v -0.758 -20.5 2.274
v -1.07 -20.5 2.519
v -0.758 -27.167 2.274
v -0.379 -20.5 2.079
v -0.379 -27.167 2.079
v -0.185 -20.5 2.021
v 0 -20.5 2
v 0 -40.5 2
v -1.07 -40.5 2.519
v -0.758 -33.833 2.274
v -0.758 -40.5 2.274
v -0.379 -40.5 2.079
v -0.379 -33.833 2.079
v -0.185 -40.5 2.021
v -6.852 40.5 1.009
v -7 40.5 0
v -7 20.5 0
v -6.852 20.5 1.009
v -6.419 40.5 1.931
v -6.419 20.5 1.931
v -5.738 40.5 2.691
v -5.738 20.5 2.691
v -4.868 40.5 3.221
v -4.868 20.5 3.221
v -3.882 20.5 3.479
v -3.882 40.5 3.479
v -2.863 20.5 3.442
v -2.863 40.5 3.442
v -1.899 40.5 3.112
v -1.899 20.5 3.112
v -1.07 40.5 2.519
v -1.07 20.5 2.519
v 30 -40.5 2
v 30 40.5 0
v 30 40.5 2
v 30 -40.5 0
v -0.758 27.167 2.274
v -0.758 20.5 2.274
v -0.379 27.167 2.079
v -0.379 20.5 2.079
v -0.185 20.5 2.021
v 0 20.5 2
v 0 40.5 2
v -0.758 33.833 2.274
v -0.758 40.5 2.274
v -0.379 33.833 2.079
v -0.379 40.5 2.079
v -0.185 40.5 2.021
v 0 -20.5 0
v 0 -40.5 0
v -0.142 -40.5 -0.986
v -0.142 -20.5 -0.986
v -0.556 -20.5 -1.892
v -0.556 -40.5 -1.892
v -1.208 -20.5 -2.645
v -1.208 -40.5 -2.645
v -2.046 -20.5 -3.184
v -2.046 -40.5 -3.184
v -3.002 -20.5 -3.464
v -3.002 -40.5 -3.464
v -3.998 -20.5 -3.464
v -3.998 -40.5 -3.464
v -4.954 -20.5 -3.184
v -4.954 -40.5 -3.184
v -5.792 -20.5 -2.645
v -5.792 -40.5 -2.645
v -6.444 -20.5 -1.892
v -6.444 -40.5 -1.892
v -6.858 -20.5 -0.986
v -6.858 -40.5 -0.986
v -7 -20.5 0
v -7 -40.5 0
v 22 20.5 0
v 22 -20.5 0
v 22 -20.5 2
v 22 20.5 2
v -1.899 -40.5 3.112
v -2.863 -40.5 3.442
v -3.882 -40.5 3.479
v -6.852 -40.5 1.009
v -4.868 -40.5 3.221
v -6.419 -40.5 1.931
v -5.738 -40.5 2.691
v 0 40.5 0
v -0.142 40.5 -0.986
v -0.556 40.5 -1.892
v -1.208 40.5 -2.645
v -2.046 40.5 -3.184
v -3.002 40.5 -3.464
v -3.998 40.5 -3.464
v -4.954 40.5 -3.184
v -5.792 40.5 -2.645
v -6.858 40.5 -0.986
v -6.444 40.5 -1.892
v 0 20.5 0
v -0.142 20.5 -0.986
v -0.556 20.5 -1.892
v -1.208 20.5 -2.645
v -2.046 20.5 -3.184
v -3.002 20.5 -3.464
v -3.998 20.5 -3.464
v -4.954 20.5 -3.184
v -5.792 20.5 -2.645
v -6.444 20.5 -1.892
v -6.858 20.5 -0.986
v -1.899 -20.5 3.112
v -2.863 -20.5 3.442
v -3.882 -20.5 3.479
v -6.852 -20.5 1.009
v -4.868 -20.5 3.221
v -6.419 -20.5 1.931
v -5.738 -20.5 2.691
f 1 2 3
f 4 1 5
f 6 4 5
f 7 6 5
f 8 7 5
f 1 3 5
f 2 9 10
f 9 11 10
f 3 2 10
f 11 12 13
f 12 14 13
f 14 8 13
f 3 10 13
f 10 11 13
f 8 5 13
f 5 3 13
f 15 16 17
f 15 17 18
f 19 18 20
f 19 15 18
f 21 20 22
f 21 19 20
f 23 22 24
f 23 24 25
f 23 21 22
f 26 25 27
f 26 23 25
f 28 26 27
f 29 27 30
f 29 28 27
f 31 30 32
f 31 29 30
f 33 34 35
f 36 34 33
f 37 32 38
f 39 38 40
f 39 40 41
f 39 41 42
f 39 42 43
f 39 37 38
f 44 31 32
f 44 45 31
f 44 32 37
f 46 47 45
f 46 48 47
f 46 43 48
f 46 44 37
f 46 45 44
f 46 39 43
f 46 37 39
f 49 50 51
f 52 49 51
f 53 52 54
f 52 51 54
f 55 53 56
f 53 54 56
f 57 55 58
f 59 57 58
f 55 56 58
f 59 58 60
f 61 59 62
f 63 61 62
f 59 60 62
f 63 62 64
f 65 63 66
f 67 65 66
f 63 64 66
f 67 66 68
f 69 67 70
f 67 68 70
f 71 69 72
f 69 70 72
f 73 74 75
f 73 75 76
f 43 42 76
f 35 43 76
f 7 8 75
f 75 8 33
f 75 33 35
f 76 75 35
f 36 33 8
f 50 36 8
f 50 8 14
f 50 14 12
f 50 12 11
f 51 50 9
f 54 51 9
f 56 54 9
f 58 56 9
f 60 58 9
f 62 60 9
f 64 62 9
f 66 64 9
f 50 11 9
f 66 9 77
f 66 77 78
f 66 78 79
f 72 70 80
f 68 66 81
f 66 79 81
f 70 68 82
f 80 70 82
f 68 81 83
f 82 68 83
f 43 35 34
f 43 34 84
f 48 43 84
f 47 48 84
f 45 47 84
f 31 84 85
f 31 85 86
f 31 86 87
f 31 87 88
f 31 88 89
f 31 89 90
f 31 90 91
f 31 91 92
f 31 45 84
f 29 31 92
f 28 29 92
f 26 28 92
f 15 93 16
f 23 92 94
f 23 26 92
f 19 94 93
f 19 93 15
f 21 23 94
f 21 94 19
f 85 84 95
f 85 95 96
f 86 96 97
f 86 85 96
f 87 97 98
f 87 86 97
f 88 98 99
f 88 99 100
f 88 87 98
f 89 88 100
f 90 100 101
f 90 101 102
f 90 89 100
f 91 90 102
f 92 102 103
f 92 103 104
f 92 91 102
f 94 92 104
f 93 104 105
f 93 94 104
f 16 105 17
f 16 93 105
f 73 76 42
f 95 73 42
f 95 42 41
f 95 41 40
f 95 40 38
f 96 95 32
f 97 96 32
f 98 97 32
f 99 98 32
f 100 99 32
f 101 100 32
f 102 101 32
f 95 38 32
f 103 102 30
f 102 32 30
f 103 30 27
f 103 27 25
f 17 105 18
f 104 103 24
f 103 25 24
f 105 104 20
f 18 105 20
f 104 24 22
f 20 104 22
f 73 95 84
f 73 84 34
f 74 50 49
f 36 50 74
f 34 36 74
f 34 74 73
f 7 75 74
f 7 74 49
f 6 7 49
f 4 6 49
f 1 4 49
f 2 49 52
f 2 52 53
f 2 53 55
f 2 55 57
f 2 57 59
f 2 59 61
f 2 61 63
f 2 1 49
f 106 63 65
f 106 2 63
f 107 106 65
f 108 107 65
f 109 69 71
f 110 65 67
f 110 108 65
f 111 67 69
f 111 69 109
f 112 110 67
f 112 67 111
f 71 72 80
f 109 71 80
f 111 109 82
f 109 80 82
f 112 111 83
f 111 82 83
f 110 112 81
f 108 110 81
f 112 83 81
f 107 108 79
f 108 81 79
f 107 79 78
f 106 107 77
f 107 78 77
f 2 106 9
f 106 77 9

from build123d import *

# Parameters (mm, degrees)
F1_DEPTH = 2
F4_DEPTH = 20


with BuildPart() as f1:
    # F0 (on Top) → F1 (new body)
    with BuildSketch(Plane.XY):
        Polygon((30, 40.5), (0, 40.5), (0, 20.5), (22, 20.5), (22, 0), (30, 0), align=None)
    extrude(amount=F1_DEPTH)

    # F3 (on offset) → F4 (join, through all)
    with BuildSketch(Plane(origin=(0, 40.5, 0), x_dir=(-1, 0, 0), z_dir=(0, 1, 0))):
        with BuildLine():
            ThreePointArc((0, 0), (3.5, -3.5), (7, 0))
            ThreePointArc((7, 0), (4.8682335874, 3.221480537), (1.0697503713, 2.5187073554))
            ThreePointArc((1.0697503713, 2.5187073554), (0.278519463, 1.3682335874), (0, 0))
        make_face()
        with BuildLine():
            ThreePointArc((0, 0), (0.278519463, 1.3682335874), (1.0697503713, 2.5187073554))
            add(Edge.make_bspline(
                [(1.0697503713, 2.5187073554), (0.8128216168, 2.2708020127), (0.3570286317, 2), (0, 2)],
                knots=[0, 0, 0, 0, 1.1888747527, 1.1888747527, 1.1888747527, 1.1888747527], degree=3))
            Line((0, 2), (0, 0))
        make_face()
    extrude(amount=-F4_DEPTH)

    # F5: F1 across plane


with BuildPart() as f1_1:
    add(f1.part)
    add(f1.part.mirror(Plane.XZ))


solid = f1_1.part
